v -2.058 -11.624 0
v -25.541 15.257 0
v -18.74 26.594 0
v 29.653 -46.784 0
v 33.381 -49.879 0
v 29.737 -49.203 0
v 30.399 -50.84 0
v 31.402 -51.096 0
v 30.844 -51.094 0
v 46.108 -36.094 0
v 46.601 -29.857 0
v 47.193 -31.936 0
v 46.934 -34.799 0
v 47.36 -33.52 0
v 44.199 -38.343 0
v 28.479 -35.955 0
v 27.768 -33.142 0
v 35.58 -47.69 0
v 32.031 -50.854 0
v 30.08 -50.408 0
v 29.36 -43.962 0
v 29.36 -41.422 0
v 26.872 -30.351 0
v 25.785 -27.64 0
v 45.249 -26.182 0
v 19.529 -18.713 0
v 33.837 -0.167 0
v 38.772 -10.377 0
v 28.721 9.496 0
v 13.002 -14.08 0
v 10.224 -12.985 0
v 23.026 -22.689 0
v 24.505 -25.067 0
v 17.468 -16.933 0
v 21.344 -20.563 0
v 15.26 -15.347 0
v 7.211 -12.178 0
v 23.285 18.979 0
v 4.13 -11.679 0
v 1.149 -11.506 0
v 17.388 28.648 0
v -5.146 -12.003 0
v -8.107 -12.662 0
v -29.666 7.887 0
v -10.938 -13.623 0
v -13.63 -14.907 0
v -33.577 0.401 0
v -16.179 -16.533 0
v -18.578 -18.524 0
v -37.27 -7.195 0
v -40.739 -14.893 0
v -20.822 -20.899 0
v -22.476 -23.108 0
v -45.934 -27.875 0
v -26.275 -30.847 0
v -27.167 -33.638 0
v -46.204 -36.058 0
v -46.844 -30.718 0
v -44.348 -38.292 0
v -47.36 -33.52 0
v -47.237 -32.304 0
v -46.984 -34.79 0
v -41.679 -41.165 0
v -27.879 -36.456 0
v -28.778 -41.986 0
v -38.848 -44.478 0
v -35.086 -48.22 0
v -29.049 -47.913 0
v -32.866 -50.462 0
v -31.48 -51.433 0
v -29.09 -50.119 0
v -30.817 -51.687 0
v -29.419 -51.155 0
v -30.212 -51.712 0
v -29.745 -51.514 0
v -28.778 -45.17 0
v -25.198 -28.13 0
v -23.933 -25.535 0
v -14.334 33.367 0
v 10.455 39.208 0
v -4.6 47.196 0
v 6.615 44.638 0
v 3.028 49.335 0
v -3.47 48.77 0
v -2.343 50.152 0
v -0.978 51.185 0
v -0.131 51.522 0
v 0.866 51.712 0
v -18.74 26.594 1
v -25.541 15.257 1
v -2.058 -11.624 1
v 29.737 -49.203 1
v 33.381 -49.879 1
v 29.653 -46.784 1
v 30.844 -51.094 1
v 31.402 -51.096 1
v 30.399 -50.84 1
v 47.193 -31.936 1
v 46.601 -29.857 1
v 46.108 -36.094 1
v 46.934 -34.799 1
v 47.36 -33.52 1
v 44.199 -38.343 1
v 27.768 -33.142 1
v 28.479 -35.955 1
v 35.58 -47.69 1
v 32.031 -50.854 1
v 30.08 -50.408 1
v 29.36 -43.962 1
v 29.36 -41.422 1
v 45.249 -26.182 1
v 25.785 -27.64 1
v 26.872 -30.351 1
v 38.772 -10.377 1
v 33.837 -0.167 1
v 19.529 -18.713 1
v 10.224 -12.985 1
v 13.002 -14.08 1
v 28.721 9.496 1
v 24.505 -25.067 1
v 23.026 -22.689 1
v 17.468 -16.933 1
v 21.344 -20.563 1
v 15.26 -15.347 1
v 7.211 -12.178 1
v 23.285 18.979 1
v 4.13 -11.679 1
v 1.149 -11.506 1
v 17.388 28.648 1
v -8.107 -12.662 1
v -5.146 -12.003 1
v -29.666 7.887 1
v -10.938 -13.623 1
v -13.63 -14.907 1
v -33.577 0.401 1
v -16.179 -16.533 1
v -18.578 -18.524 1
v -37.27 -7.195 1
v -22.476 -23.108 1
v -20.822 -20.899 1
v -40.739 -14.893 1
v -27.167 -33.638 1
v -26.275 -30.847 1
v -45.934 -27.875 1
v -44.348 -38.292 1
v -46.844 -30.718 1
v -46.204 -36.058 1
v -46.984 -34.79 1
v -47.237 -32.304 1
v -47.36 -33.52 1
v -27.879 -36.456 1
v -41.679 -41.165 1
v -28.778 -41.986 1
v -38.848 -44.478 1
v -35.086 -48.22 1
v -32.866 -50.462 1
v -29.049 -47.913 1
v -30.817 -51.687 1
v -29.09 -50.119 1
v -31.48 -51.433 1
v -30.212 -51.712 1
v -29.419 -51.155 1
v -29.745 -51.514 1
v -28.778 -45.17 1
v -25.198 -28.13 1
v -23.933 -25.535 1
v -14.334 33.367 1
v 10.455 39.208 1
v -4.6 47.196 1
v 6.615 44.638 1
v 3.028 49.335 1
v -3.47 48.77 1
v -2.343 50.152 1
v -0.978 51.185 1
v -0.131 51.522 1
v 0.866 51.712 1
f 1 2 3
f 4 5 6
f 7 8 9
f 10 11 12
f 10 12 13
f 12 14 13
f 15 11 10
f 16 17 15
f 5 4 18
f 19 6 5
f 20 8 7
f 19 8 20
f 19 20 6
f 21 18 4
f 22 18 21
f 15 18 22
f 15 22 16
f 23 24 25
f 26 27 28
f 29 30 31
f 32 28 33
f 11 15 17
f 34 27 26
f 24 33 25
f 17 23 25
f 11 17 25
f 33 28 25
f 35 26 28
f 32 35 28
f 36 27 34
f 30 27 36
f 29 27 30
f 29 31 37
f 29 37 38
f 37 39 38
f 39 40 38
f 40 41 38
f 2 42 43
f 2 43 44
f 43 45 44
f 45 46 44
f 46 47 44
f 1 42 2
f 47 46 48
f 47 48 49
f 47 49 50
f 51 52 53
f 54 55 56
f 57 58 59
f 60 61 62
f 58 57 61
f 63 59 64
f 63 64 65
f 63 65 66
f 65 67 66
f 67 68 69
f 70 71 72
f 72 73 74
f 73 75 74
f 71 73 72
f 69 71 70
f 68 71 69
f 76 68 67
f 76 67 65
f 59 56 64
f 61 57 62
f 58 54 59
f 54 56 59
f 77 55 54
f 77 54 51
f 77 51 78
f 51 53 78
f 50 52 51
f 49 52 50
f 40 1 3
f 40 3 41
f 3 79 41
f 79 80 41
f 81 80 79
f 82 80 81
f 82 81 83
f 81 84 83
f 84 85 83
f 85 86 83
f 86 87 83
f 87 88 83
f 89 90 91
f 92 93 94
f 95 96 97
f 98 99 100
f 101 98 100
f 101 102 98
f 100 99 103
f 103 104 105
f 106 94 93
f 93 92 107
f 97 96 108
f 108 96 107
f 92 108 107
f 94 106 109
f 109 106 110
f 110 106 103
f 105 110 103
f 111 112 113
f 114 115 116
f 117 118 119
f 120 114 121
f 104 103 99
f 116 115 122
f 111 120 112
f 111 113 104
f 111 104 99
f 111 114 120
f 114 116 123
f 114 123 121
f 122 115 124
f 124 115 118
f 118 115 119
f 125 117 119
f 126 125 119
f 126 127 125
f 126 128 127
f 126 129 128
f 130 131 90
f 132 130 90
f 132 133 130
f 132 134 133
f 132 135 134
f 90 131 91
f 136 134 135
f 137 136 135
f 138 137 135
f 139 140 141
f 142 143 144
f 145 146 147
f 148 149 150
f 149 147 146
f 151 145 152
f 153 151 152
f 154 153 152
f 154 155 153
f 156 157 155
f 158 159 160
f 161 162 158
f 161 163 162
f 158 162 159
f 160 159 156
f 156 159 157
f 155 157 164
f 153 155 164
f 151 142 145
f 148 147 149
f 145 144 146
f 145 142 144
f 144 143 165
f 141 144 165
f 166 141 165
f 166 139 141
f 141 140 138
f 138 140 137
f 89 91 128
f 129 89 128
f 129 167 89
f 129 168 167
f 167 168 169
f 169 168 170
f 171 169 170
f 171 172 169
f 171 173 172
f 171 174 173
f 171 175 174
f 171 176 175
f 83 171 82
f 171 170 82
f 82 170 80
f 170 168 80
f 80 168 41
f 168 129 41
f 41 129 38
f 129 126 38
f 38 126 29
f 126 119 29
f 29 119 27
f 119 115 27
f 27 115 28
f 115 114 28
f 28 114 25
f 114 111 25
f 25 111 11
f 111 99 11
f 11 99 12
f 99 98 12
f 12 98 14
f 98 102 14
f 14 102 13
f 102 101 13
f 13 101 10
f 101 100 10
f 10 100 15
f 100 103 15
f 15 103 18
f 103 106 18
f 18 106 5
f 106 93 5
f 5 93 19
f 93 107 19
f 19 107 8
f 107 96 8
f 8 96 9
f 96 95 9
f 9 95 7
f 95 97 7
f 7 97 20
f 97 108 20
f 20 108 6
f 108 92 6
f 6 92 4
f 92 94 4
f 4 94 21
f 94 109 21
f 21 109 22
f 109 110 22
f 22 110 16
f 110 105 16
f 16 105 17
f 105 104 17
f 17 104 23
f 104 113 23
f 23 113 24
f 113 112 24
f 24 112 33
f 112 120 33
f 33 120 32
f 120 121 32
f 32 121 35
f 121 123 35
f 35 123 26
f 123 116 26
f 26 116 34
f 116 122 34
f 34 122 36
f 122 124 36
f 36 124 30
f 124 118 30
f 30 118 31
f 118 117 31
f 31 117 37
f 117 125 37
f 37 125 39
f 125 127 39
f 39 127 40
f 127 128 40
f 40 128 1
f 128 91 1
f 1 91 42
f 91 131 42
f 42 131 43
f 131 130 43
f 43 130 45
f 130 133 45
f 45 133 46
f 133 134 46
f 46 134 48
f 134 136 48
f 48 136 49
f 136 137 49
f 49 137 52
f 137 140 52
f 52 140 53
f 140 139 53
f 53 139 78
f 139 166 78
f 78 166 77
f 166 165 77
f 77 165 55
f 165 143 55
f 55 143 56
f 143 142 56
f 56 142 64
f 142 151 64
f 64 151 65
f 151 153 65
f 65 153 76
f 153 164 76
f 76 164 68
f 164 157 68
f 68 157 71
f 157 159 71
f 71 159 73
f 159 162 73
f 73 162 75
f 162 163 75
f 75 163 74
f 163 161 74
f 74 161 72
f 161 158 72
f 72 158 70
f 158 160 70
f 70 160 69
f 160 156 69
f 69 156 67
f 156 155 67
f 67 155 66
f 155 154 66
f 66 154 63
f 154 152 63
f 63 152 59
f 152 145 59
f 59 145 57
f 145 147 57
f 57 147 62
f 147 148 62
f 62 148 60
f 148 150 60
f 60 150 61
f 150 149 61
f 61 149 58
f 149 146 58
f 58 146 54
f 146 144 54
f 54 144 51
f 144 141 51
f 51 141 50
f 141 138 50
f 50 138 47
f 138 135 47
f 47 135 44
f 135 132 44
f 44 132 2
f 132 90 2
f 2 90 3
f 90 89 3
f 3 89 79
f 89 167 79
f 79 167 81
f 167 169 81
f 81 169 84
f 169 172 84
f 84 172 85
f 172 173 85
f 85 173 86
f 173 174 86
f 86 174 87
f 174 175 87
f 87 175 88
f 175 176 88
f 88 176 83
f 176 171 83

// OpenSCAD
// Module names are of the form poly_<inkscape-path-id>().  As a result,
// you can associate a polygon in this OpenSCAD program with the corresponding
// SVG element in the Inkscape document by looking for the XML element with
// the attribute id="inkscape-path-id".

// fudge value is used to ensure that subtracted solids are a tad taller
// in the z dimension than the polygon being subtracted from.  This helps
// keep the resulting .stl file manifold.
fudge = 0.1;

module poly_Selection(h)
{
  scale([25.4/90, -25.4/90, 1]) union()
  {
    linear_extrude(height=h)
      polygon([[10.730000,-174.810000],[23.440156,-158.167813],[37.043750,-138.925000],[61.610000,-101.510000],[82.505313,-67.248906],[101.767500,-33.648750],[119.893438,0.590781],[137.380000,36.770000],[160.330000,92.770000],[165.120000,105.792500],[167.220625,113.160625],[167.810000,118.770000],[166.300469,123.302187],[163.376250,127.892500],[156.610000,135.860000],[126.070000,168.980000],[118.280000,176.735000],[113.495313,180.190625],[111.265273,181.050078],[109.290000,181.040000],[107.712090,180.141875],[106.581719,178.611875],[105.368750,174.342500],[105.070000,165.770000],[104.030000,155.770000],[104.030000,146.770000],[100.908750,127.400000],[98.390938,117.430703],[95.215000,107.542500],[91.365938,97.938359],[86.828750,88.821250],[81.588437,80.394141],[75.630000,72.860000],[69.198594,66.305156],[61.896250,59.998750],[54.070781,54.380469],[46.070000,49.890000],[36.225313,46.008281],[25.550000,43.151250],[14.634687,41.383594],[4.070000,40.770000],[-7.293672,41.188145],[-18.233125,42.528906],[-28.727266,44.865527],[-38.755000,48.271250],[-48.295234,52.819316],[-57.326875,58.582969],[-65.828828,65.635449],[-73.780000,74.050000],[-79.637949,81.880215],[-84.801094,90.476719],[-89.283379,99.672051],[-93.098750,109.298750],[-96.261152,119.189355],[-98.784531,129.176406],[-101.970000,148.770000],[-101.970000,160.050000],[-102.930000,169.770000],[-103.073750,177.587500],[-104.239219,181.259063],[-105.395996,182.529414],[-107.050000,183.230000],[-109.195215,183.141855],[-111.544219,182.243594],[-116.453750,178.803750],[-124.320000,170.860000],[-137.650000,157.600000],[-147.680000,145.860000],[-157.140000,135.680000],[-163.716250,127.765000],[-166.478906,123.271250],[-167.810000,118.770000],[-167.375313,114.463750],[-165.982500,108.845000],[-162.760000,98.770000],[-144.350000,52.770000],[-132.058906,25.492969],[-118.973750,-1.421250],[-105.114219,-27.947344],[-90.500000,-54.060000],[-66.400000,-94.230000],[-50.790000,-118.230000],[-16.300000,-167.230000],[-12.294688,-172.806875],[-8.302500,-177.705000],[-3.466563,-181.365625],[-0.464414,-182.557266],[3.070000,-183.230000],[10.730000,-174.810000]]);
  }
}

module bu(h)
{

poly_Selection(h);
}

bu(1);
